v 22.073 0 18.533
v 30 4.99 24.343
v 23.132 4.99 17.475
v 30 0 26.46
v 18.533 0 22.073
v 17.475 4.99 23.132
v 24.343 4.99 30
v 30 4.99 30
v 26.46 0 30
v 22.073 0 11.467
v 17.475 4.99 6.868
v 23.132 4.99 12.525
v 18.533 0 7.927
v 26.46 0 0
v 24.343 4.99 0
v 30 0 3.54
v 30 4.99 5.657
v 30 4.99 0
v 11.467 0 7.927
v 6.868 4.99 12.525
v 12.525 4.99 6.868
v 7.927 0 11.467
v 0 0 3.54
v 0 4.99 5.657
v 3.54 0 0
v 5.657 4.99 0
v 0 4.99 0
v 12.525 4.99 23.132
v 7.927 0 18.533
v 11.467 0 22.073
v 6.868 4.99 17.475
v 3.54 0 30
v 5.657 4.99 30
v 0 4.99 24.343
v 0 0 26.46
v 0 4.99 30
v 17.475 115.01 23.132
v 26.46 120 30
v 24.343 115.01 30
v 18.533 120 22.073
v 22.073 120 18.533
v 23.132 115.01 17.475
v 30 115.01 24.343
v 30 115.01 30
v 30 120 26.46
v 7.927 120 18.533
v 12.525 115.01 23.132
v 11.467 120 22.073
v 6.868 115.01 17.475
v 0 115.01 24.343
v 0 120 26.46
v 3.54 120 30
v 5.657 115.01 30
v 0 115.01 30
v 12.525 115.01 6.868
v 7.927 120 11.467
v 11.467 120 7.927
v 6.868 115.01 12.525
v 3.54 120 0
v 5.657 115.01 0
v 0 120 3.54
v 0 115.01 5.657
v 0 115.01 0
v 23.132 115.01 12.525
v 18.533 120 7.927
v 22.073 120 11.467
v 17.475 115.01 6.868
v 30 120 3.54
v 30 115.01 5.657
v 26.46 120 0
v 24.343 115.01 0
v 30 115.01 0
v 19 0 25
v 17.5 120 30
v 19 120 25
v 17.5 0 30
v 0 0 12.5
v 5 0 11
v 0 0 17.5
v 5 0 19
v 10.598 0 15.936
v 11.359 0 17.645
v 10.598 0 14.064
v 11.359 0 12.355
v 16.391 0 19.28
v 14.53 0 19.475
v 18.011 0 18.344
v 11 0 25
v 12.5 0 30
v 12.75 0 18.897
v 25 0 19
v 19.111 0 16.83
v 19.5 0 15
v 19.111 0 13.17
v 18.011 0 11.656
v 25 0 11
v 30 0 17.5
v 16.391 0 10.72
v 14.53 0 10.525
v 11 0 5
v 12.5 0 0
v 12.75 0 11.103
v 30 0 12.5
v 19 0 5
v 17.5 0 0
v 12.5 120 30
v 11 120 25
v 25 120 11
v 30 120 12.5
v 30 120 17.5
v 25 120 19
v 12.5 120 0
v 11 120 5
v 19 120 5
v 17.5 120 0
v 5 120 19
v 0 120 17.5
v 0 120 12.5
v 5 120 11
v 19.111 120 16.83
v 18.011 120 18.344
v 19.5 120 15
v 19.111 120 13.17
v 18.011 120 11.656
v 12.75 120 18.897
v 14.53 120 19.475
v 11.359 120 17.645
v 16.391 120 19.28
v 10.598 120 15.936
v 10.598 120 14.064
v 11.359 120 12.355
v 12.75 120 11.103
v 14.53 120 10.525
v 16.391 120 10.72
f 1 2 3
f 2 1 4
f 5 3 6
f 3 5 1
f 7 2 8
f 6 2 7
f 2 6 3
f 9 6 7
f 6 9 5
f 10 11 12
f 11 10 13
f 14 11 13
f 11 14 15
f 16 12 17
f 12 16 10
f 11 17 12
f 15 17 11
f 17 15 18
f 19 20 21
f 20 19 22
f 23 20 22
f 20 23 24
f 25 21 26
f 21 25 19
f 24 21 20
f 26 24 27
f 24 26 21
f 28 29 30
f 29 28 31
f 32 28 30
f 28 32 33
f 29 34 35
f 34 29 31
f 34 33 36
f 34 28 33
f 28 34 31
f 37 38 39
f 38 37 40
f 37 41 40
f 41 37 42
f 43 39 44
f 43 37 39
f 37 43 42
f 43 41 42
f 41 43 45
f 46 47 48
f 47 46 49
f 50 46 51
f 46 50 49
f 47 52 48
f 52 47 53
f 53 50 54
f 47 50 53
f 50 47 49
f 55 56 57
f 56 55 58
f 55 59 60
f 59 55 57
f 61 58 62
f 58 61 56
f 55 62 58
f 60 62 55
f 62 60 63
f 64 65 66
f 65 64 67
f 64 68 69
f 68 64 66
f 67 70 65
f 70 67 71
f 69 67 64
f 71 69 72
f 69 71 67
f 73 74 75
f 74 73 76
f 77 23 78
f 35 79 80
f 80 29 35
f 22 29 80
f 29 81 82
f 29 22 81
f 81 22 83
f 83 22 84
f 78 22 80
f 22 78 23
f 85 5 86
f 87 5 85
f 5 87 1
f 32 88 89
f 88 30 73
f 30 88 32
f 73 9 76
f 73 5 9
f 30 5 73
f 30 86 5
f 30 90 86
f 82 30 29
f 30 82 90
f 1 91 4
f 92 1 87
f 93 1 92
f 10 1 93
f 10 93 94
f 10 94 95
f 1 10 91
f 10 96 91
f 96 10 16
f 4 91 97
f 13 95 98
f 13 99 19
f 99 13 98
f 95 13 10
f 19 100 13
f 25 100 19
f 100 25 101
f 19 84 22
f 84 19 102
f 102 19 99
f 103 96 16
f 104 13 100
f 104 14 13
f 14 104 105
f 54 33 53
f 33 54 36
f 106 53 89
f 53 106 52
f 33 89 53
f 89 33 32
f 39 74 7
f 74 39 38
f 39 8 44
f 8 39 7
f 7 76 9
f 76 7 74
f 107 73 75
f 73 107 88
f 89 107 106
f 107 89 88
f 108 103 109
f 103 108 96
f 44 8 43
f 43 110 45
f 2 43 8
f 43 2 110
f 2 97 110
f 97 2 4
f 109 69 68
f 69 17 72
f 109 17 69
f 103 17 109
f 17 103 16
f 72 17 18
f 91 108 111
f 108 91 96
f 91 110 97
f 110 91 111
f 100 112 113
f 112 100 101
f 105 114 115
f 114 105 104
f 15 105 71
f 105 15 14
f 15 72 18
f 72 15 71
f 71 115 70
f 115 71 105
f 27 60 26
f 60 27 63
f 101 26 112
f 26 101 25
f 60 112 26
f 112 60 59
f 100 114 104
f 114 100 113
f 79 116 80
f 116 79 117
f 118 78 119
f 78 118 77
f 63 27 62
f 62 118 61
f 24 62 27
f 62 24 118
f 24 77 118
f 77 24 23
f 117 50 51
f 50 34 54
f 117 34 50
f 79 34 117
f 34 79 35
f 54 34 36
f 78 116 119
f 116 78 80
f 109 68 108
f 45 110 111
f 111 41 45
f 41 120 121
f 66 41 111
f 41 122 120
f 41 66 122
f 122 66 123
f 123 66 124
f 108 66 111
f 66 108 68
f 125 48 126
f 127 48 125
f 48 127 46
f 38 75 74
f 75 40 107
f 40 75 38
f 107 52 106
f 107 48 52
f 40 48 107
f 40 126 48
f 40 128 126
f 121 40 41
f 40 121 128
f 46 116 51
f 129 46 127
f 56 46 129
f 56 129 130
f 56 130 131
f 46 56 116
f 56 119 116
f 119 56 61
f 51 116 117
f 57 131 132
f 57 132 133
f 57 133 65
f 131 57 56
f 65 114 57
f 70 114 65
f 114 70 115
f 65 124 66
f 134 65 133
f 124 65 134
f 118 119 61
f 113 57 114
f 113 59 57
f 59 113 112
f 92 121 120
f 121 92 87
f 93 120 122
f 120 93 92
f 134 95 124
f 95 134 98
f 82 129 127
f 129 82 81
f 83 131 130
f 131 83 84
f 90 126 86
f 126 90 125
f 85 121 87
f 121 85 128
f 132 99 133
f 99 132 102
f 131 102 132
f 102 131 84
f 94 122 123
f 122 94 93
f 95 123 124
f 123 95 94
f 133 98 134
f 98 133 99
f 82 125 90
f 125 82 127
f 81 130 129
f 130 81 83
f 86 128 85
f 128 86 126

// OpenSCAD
// file: ../../globals.scad
/*
Most things in this file is represented as one millimeter, so keep that in mind while changing things.
Some of the setting are not mm but at variables that you can set, such as 2*x=2x and you are setting what x is.
I will try to specify when things are variables and not exact measurements.
*/

//Virindi settings
dovetail_male_width_scale = 0.98;
dovetail_male_height_scale = 0.91;

obj_leg = 30;
leg_length = 5.5;
small_number = 0.001;
metal_core_rode_global = 5;


///////////////// number of holes /////////////////////
z_hole_number = 8;
other_holes = 8;

///////////////// Pins /////////////////////

//pins that poke out
ball_size = 10;
pin_height = 20;
pin_diameter = 6;


//holes
hole_ball_size = ball_size;
hole_pin_height = pin_height;
hole_pin_diameter = pin_diameter;

///////////////// Z THINGS /////////////////////

berring_slot_width = 7.5;
berring_slot_depth = 6.5;
metal_core_rode = 5;

///////////////// X THINGS /////////////////////

//male dove tails
max_width=8;
min_width=5;
depth=5;
height=obj_leg/2;

//female dove tails, this is found on the y mounts
girl_max_width=11;
girl_min_width=5;
girl_depth=5;
girl_height=obj_leg;


///////////////// Y THINGS /////////////////////
/*
The Y is so normal that all of those global variables at the top should change all of the setting in it, this section is set her incase there are variables set in the future development of this project.
*/
// file: ../../include.scad
//////////////////      END SECTION       //////////////////

	module added_pins(){
		difference(){
			union(){
				translate([30/(15/4),obj_leg*leg_length,30/(15/4)]) pin();
				translate([30/(15/4)+14.5,obj_leg*leg_length,30/(15/4)+14]) pin();
			}
			union(){
							translate([30/(15/4)+13.5,obj_leg*leg_length-20,30/(15/4)+5])cube(size=[2,40,15]);
							translate([30/(15/4)+7.5,obj_leg*leg_length-20,30/(15/4)+15])rotate([0,90,0]) cube(size=[2,40,15]);	

							translate([30/(15/4)-1,obj_leg*leg_length-20,30/(15/4)-8])cube(size=[2,40,15]);
							translate([30/(15/4)-10,obj_leg*leg_length-20,30/(15/4)+1])rotate([0,90,0]) cube(size=[2,40,15]);
			}
		}
	}
	module taken_pins() {
		translate([30/(15/4)+14,obj_leg*leg_length-10,30/(15/4)]) mirror_pin();
		translate([30/(15/4),obj_leg*leg_length-10,30/(15/4)+15]) mirror_pin();
	}


//////////////////      OTHER STUFF       //////////////////

	module holes() {
		rotate([0,0,90]) for(y=[0:other_holes])
		translate([obj_leg+y*15,-15.5,7.5]) union() {
			translate([7.5,0,15]) hole_up();
			hole_down();
		}
	}
	module extend_holes() {
	module top(){
		rotate([0,0,90]) for(y=[0:other_holes+1])
		translate([(30/4)+y*15,-15.5,7.5]) union() {
			translate([7.5,0,15]) hole_up();
		}
	}
	module bottom(){
		rotate([0,0,90]) for(y=[0:other_holes+2])
		translate([(30/4)+y*15,-15.5,7.5]) union() {
			hole_down();
		
}
	}
	union(){
		top();
		bottom();
	}
	}

	module hole() {
		union() {
			rotate([90, 90, 0]) cylinder(h=40, d=hole_pin_diameter, center=true);
			translate([0,7.5,0]) sphere(d=hole_ball_size);
			translate([0,-6,0]) sphere(d=hole_ball_size);
		}
	}
	module hole_up() {
		union() {
			rotate([90, 90, 0]) cylinder(h=40, d=hole_pin_diameter, center=true);
			translate([0,7.5,10]) cylinder(h=hole_pin_height, d=hole_pin_diameter, center=true);
			translate([0,-6,10]) cylinder(h=hole_pin_height, d=hole_pin_diameter, center=true);
			translate([0,7.5,0]) sphere(d=hole_ball_size);
			translate([0,-6,0]) sphere(d=hole_ball_size);
		}
	}
	module hole_down() {
		union() {
			rotate([90, 90, 0]) cylinder(h=40, d=hole_pin_diameter, center=true);
			translate([0,7.5,-10]) cylinder(h=hole_pin_height, d=hole_pin_diameter, center=true);
			translate([0,-6,-10]) cylinder(h=hole_pin_height, d=hole_pin_diameter, center=true);
			translate([0,7.5,0]) sphere(d=hole_ball_size);
			translate([0,-6,0]) sphere(d=hole_ball_size);
		}
	}
	module pin() {
		union() {
			rotate([90, 90, 0]) cylinder(h=pin_height, d=pin_diameter, center=true);
			translate([0,7.5,0]) sphere(d=ball_size);
		}
	}

	module mirror_pin() {
		rotate([90, 90, 0]) cylinder(h=hole_pin_height+small_number, d=hole_pin_diameter, center=true);
		translate([0,-(pin_height-(ball_size/2)),0]) sphere(d=ball_size);
	}


//////////////////      SOME RACK AND Z THINGS       //////////////////

module z_holes() {
    rotate([0,-90,0]) for(z=[0:z_hole_number])
    translate([22.5+z*15,16,-12])
        hole();
}

module pin_cuts() {
	union(){
		cube(size=[2,10,40], center=true);
		rotate([0,0,90]) cube(size=[2,10,40], center=true);
	}
}
module pin_uncut() {
	union(){
		rotate([0, 0, 90]) cylinder(h=hole_pin_height, d=hole_pin_diameter, center=true);
		translate([0,0,10]) sphere(d=ball_hole);
	}
}


module pin_out() {
	union(){
		rotate([0, 0, 90]) cylinder(h=pin_height, d=pin_diameter, center=true);
		translate([0,0,10]) sphere(d= ball_size);
	}
}


module pins_z(){
	difference() {
		pin_out();
		pin_cuts();
	}
}
//////////////////      RACK AND SLIDE     ///////////////////

module straight_pins() {
	for(z=[0:((((obj_leg*leg_length)*2)-(obj_leg*2))/3)/14.5]) rotate([-90,0,0]) translate([z*15,30/(15/4),14]) pins_z();
	for(z=[0:((((obj_leg*leg_length)*2)-(obj_leg*2))/3)/14.5]) rotate([-90,0,0]) translate([z*15,30/(15/4)-14,14]) pins_z();
}
module stagger_pins() {
	for(z=[0:((((obj_leg*leg_length)*2)-(obj_leg*2))/3)/14.5]) rotate([-90,0,0]) translate([z*15,30/(15/4),14]) pins_z();
	for(z=[0:((((obj_leg*leg_length)*2)-(obj_leg*2))/3)/14.5]) rotate([-90,0,0]) translate([z*15+7,30/(15/4)-14,14]) pins_z();
}


//////////////////      DOVE TAIL       //////////////////

module male_dovetail(height) {
	dovetail_3d(max_width,min_width,depth,height);
}

module dovetail_3d(max_width=11, min_width=5, depth=5, height=30) {
	linear_extrude(height=height, convexity=2)
		dovetail_2d(max_width,min_width,depth);
}

module dovetail_2d(max_width=11, min_width=5, depth=5) {
	angle=atan((max_width/2-min_width/2)/depth);
	echo("angle: ", angle);
	polygon(paths=[[0,1,2,3,0]], points=[[-min_width/2,0], [-max_width/2,depth], [max_width/2, depth], [min_width/2,0]]);
}

//bow tie
	module tie_end(height){
				rotate([0,0,0]) translate([0,-0.01,((obj_leg/2)/2)]) male_dovetail(height);
				rotate([0,90,0]) translate([0,-0.01,((obj_leg/2)/2)]) male_dovetail(height);
				rotate([0,180,0]) translate([0,-0.01,((obj_leg/2)/2)]) male_dovetail(height);
				rotate([0,-90,0]) translate([0,-0.01,((obj_leg/2)/2)]) male_dovetail(height);
	}

module bow_support(){
	difference(){
		intersection(){
			translate([-15,0,-15]) cube([30,9,30]);
			scale([1.05,1.05,1.05]) rotate([0,45,0]) tie_end();
		}
		cube([29.2,29.2,29.2], center=true);
	}
}

	module wrap(units){
	for (y = [-1:units-2]) // two iterations, z = -1, z = 1
	{
			translate([15, (y*30)+15, 15]){
			for (r = [0:4]) // two iterations, z = -1, z = 1
			{
				rotate([0,r*90,0]) translate([0,15,15]) rotate([-90,0,0])male_dovetail(height=30);
			}
		}
	}
	}
// file: extension.scad
include <../../include.scad>;
include <../../globals.scad>;
metal_rod_size = 9;
support = true;
//min number of units is 2
//max is however large your printer can print

module extension(units = 4){
	
	module added(){
			translate([0,0,0]) cube([30,30*units,30]);
	}

	module subtracted(){
	translate([15,0,15]) rotate([0,45,0]) tie_end();
	translate([15,units*30,15]) rotate([0,45,0]) rotate([0,0,180]) tie_end();
	translate([15,15,15]) rotate([90,0,0]) cylinder(h=5000, d= metal_rod_size, center=true);

	for (y = [-1:units-2]) // two iterations, z = -1, z = 1
	{
			translate([15, (y*30)+15, 15]){
			for (r = [0:4]) // two iterations, z = -1, z = 1
			{
				rotate([0,r*90,0]) translate([0,15,15]) rotate([-90,0,0])male_dovetail(height=30);
			}
		}
	}

	} //subtracted
	difference(){
		added();
		subtracted();
	}	
} //module extension

//support
if (support==true)
{
	translate([0,0,5/2]) cylinder(h=5, d=6, center=true);
	translate([30,0,5/2]) cylinder(h=5, d=6, center=true);
	translate([0,-30,5/2]) cylinder(h=5, d=6, center=true);
	translate([30,-30,5/2]) cylinder(h=5, d=6, center=true);
}

module extension_finished(units = 4){
		rotate([90,0,0]) extension(units);
}

//extension_finished();
// main file
use <extension.scad>

rotate([-90,0,0])
extension_finished(units=4,support=false);
